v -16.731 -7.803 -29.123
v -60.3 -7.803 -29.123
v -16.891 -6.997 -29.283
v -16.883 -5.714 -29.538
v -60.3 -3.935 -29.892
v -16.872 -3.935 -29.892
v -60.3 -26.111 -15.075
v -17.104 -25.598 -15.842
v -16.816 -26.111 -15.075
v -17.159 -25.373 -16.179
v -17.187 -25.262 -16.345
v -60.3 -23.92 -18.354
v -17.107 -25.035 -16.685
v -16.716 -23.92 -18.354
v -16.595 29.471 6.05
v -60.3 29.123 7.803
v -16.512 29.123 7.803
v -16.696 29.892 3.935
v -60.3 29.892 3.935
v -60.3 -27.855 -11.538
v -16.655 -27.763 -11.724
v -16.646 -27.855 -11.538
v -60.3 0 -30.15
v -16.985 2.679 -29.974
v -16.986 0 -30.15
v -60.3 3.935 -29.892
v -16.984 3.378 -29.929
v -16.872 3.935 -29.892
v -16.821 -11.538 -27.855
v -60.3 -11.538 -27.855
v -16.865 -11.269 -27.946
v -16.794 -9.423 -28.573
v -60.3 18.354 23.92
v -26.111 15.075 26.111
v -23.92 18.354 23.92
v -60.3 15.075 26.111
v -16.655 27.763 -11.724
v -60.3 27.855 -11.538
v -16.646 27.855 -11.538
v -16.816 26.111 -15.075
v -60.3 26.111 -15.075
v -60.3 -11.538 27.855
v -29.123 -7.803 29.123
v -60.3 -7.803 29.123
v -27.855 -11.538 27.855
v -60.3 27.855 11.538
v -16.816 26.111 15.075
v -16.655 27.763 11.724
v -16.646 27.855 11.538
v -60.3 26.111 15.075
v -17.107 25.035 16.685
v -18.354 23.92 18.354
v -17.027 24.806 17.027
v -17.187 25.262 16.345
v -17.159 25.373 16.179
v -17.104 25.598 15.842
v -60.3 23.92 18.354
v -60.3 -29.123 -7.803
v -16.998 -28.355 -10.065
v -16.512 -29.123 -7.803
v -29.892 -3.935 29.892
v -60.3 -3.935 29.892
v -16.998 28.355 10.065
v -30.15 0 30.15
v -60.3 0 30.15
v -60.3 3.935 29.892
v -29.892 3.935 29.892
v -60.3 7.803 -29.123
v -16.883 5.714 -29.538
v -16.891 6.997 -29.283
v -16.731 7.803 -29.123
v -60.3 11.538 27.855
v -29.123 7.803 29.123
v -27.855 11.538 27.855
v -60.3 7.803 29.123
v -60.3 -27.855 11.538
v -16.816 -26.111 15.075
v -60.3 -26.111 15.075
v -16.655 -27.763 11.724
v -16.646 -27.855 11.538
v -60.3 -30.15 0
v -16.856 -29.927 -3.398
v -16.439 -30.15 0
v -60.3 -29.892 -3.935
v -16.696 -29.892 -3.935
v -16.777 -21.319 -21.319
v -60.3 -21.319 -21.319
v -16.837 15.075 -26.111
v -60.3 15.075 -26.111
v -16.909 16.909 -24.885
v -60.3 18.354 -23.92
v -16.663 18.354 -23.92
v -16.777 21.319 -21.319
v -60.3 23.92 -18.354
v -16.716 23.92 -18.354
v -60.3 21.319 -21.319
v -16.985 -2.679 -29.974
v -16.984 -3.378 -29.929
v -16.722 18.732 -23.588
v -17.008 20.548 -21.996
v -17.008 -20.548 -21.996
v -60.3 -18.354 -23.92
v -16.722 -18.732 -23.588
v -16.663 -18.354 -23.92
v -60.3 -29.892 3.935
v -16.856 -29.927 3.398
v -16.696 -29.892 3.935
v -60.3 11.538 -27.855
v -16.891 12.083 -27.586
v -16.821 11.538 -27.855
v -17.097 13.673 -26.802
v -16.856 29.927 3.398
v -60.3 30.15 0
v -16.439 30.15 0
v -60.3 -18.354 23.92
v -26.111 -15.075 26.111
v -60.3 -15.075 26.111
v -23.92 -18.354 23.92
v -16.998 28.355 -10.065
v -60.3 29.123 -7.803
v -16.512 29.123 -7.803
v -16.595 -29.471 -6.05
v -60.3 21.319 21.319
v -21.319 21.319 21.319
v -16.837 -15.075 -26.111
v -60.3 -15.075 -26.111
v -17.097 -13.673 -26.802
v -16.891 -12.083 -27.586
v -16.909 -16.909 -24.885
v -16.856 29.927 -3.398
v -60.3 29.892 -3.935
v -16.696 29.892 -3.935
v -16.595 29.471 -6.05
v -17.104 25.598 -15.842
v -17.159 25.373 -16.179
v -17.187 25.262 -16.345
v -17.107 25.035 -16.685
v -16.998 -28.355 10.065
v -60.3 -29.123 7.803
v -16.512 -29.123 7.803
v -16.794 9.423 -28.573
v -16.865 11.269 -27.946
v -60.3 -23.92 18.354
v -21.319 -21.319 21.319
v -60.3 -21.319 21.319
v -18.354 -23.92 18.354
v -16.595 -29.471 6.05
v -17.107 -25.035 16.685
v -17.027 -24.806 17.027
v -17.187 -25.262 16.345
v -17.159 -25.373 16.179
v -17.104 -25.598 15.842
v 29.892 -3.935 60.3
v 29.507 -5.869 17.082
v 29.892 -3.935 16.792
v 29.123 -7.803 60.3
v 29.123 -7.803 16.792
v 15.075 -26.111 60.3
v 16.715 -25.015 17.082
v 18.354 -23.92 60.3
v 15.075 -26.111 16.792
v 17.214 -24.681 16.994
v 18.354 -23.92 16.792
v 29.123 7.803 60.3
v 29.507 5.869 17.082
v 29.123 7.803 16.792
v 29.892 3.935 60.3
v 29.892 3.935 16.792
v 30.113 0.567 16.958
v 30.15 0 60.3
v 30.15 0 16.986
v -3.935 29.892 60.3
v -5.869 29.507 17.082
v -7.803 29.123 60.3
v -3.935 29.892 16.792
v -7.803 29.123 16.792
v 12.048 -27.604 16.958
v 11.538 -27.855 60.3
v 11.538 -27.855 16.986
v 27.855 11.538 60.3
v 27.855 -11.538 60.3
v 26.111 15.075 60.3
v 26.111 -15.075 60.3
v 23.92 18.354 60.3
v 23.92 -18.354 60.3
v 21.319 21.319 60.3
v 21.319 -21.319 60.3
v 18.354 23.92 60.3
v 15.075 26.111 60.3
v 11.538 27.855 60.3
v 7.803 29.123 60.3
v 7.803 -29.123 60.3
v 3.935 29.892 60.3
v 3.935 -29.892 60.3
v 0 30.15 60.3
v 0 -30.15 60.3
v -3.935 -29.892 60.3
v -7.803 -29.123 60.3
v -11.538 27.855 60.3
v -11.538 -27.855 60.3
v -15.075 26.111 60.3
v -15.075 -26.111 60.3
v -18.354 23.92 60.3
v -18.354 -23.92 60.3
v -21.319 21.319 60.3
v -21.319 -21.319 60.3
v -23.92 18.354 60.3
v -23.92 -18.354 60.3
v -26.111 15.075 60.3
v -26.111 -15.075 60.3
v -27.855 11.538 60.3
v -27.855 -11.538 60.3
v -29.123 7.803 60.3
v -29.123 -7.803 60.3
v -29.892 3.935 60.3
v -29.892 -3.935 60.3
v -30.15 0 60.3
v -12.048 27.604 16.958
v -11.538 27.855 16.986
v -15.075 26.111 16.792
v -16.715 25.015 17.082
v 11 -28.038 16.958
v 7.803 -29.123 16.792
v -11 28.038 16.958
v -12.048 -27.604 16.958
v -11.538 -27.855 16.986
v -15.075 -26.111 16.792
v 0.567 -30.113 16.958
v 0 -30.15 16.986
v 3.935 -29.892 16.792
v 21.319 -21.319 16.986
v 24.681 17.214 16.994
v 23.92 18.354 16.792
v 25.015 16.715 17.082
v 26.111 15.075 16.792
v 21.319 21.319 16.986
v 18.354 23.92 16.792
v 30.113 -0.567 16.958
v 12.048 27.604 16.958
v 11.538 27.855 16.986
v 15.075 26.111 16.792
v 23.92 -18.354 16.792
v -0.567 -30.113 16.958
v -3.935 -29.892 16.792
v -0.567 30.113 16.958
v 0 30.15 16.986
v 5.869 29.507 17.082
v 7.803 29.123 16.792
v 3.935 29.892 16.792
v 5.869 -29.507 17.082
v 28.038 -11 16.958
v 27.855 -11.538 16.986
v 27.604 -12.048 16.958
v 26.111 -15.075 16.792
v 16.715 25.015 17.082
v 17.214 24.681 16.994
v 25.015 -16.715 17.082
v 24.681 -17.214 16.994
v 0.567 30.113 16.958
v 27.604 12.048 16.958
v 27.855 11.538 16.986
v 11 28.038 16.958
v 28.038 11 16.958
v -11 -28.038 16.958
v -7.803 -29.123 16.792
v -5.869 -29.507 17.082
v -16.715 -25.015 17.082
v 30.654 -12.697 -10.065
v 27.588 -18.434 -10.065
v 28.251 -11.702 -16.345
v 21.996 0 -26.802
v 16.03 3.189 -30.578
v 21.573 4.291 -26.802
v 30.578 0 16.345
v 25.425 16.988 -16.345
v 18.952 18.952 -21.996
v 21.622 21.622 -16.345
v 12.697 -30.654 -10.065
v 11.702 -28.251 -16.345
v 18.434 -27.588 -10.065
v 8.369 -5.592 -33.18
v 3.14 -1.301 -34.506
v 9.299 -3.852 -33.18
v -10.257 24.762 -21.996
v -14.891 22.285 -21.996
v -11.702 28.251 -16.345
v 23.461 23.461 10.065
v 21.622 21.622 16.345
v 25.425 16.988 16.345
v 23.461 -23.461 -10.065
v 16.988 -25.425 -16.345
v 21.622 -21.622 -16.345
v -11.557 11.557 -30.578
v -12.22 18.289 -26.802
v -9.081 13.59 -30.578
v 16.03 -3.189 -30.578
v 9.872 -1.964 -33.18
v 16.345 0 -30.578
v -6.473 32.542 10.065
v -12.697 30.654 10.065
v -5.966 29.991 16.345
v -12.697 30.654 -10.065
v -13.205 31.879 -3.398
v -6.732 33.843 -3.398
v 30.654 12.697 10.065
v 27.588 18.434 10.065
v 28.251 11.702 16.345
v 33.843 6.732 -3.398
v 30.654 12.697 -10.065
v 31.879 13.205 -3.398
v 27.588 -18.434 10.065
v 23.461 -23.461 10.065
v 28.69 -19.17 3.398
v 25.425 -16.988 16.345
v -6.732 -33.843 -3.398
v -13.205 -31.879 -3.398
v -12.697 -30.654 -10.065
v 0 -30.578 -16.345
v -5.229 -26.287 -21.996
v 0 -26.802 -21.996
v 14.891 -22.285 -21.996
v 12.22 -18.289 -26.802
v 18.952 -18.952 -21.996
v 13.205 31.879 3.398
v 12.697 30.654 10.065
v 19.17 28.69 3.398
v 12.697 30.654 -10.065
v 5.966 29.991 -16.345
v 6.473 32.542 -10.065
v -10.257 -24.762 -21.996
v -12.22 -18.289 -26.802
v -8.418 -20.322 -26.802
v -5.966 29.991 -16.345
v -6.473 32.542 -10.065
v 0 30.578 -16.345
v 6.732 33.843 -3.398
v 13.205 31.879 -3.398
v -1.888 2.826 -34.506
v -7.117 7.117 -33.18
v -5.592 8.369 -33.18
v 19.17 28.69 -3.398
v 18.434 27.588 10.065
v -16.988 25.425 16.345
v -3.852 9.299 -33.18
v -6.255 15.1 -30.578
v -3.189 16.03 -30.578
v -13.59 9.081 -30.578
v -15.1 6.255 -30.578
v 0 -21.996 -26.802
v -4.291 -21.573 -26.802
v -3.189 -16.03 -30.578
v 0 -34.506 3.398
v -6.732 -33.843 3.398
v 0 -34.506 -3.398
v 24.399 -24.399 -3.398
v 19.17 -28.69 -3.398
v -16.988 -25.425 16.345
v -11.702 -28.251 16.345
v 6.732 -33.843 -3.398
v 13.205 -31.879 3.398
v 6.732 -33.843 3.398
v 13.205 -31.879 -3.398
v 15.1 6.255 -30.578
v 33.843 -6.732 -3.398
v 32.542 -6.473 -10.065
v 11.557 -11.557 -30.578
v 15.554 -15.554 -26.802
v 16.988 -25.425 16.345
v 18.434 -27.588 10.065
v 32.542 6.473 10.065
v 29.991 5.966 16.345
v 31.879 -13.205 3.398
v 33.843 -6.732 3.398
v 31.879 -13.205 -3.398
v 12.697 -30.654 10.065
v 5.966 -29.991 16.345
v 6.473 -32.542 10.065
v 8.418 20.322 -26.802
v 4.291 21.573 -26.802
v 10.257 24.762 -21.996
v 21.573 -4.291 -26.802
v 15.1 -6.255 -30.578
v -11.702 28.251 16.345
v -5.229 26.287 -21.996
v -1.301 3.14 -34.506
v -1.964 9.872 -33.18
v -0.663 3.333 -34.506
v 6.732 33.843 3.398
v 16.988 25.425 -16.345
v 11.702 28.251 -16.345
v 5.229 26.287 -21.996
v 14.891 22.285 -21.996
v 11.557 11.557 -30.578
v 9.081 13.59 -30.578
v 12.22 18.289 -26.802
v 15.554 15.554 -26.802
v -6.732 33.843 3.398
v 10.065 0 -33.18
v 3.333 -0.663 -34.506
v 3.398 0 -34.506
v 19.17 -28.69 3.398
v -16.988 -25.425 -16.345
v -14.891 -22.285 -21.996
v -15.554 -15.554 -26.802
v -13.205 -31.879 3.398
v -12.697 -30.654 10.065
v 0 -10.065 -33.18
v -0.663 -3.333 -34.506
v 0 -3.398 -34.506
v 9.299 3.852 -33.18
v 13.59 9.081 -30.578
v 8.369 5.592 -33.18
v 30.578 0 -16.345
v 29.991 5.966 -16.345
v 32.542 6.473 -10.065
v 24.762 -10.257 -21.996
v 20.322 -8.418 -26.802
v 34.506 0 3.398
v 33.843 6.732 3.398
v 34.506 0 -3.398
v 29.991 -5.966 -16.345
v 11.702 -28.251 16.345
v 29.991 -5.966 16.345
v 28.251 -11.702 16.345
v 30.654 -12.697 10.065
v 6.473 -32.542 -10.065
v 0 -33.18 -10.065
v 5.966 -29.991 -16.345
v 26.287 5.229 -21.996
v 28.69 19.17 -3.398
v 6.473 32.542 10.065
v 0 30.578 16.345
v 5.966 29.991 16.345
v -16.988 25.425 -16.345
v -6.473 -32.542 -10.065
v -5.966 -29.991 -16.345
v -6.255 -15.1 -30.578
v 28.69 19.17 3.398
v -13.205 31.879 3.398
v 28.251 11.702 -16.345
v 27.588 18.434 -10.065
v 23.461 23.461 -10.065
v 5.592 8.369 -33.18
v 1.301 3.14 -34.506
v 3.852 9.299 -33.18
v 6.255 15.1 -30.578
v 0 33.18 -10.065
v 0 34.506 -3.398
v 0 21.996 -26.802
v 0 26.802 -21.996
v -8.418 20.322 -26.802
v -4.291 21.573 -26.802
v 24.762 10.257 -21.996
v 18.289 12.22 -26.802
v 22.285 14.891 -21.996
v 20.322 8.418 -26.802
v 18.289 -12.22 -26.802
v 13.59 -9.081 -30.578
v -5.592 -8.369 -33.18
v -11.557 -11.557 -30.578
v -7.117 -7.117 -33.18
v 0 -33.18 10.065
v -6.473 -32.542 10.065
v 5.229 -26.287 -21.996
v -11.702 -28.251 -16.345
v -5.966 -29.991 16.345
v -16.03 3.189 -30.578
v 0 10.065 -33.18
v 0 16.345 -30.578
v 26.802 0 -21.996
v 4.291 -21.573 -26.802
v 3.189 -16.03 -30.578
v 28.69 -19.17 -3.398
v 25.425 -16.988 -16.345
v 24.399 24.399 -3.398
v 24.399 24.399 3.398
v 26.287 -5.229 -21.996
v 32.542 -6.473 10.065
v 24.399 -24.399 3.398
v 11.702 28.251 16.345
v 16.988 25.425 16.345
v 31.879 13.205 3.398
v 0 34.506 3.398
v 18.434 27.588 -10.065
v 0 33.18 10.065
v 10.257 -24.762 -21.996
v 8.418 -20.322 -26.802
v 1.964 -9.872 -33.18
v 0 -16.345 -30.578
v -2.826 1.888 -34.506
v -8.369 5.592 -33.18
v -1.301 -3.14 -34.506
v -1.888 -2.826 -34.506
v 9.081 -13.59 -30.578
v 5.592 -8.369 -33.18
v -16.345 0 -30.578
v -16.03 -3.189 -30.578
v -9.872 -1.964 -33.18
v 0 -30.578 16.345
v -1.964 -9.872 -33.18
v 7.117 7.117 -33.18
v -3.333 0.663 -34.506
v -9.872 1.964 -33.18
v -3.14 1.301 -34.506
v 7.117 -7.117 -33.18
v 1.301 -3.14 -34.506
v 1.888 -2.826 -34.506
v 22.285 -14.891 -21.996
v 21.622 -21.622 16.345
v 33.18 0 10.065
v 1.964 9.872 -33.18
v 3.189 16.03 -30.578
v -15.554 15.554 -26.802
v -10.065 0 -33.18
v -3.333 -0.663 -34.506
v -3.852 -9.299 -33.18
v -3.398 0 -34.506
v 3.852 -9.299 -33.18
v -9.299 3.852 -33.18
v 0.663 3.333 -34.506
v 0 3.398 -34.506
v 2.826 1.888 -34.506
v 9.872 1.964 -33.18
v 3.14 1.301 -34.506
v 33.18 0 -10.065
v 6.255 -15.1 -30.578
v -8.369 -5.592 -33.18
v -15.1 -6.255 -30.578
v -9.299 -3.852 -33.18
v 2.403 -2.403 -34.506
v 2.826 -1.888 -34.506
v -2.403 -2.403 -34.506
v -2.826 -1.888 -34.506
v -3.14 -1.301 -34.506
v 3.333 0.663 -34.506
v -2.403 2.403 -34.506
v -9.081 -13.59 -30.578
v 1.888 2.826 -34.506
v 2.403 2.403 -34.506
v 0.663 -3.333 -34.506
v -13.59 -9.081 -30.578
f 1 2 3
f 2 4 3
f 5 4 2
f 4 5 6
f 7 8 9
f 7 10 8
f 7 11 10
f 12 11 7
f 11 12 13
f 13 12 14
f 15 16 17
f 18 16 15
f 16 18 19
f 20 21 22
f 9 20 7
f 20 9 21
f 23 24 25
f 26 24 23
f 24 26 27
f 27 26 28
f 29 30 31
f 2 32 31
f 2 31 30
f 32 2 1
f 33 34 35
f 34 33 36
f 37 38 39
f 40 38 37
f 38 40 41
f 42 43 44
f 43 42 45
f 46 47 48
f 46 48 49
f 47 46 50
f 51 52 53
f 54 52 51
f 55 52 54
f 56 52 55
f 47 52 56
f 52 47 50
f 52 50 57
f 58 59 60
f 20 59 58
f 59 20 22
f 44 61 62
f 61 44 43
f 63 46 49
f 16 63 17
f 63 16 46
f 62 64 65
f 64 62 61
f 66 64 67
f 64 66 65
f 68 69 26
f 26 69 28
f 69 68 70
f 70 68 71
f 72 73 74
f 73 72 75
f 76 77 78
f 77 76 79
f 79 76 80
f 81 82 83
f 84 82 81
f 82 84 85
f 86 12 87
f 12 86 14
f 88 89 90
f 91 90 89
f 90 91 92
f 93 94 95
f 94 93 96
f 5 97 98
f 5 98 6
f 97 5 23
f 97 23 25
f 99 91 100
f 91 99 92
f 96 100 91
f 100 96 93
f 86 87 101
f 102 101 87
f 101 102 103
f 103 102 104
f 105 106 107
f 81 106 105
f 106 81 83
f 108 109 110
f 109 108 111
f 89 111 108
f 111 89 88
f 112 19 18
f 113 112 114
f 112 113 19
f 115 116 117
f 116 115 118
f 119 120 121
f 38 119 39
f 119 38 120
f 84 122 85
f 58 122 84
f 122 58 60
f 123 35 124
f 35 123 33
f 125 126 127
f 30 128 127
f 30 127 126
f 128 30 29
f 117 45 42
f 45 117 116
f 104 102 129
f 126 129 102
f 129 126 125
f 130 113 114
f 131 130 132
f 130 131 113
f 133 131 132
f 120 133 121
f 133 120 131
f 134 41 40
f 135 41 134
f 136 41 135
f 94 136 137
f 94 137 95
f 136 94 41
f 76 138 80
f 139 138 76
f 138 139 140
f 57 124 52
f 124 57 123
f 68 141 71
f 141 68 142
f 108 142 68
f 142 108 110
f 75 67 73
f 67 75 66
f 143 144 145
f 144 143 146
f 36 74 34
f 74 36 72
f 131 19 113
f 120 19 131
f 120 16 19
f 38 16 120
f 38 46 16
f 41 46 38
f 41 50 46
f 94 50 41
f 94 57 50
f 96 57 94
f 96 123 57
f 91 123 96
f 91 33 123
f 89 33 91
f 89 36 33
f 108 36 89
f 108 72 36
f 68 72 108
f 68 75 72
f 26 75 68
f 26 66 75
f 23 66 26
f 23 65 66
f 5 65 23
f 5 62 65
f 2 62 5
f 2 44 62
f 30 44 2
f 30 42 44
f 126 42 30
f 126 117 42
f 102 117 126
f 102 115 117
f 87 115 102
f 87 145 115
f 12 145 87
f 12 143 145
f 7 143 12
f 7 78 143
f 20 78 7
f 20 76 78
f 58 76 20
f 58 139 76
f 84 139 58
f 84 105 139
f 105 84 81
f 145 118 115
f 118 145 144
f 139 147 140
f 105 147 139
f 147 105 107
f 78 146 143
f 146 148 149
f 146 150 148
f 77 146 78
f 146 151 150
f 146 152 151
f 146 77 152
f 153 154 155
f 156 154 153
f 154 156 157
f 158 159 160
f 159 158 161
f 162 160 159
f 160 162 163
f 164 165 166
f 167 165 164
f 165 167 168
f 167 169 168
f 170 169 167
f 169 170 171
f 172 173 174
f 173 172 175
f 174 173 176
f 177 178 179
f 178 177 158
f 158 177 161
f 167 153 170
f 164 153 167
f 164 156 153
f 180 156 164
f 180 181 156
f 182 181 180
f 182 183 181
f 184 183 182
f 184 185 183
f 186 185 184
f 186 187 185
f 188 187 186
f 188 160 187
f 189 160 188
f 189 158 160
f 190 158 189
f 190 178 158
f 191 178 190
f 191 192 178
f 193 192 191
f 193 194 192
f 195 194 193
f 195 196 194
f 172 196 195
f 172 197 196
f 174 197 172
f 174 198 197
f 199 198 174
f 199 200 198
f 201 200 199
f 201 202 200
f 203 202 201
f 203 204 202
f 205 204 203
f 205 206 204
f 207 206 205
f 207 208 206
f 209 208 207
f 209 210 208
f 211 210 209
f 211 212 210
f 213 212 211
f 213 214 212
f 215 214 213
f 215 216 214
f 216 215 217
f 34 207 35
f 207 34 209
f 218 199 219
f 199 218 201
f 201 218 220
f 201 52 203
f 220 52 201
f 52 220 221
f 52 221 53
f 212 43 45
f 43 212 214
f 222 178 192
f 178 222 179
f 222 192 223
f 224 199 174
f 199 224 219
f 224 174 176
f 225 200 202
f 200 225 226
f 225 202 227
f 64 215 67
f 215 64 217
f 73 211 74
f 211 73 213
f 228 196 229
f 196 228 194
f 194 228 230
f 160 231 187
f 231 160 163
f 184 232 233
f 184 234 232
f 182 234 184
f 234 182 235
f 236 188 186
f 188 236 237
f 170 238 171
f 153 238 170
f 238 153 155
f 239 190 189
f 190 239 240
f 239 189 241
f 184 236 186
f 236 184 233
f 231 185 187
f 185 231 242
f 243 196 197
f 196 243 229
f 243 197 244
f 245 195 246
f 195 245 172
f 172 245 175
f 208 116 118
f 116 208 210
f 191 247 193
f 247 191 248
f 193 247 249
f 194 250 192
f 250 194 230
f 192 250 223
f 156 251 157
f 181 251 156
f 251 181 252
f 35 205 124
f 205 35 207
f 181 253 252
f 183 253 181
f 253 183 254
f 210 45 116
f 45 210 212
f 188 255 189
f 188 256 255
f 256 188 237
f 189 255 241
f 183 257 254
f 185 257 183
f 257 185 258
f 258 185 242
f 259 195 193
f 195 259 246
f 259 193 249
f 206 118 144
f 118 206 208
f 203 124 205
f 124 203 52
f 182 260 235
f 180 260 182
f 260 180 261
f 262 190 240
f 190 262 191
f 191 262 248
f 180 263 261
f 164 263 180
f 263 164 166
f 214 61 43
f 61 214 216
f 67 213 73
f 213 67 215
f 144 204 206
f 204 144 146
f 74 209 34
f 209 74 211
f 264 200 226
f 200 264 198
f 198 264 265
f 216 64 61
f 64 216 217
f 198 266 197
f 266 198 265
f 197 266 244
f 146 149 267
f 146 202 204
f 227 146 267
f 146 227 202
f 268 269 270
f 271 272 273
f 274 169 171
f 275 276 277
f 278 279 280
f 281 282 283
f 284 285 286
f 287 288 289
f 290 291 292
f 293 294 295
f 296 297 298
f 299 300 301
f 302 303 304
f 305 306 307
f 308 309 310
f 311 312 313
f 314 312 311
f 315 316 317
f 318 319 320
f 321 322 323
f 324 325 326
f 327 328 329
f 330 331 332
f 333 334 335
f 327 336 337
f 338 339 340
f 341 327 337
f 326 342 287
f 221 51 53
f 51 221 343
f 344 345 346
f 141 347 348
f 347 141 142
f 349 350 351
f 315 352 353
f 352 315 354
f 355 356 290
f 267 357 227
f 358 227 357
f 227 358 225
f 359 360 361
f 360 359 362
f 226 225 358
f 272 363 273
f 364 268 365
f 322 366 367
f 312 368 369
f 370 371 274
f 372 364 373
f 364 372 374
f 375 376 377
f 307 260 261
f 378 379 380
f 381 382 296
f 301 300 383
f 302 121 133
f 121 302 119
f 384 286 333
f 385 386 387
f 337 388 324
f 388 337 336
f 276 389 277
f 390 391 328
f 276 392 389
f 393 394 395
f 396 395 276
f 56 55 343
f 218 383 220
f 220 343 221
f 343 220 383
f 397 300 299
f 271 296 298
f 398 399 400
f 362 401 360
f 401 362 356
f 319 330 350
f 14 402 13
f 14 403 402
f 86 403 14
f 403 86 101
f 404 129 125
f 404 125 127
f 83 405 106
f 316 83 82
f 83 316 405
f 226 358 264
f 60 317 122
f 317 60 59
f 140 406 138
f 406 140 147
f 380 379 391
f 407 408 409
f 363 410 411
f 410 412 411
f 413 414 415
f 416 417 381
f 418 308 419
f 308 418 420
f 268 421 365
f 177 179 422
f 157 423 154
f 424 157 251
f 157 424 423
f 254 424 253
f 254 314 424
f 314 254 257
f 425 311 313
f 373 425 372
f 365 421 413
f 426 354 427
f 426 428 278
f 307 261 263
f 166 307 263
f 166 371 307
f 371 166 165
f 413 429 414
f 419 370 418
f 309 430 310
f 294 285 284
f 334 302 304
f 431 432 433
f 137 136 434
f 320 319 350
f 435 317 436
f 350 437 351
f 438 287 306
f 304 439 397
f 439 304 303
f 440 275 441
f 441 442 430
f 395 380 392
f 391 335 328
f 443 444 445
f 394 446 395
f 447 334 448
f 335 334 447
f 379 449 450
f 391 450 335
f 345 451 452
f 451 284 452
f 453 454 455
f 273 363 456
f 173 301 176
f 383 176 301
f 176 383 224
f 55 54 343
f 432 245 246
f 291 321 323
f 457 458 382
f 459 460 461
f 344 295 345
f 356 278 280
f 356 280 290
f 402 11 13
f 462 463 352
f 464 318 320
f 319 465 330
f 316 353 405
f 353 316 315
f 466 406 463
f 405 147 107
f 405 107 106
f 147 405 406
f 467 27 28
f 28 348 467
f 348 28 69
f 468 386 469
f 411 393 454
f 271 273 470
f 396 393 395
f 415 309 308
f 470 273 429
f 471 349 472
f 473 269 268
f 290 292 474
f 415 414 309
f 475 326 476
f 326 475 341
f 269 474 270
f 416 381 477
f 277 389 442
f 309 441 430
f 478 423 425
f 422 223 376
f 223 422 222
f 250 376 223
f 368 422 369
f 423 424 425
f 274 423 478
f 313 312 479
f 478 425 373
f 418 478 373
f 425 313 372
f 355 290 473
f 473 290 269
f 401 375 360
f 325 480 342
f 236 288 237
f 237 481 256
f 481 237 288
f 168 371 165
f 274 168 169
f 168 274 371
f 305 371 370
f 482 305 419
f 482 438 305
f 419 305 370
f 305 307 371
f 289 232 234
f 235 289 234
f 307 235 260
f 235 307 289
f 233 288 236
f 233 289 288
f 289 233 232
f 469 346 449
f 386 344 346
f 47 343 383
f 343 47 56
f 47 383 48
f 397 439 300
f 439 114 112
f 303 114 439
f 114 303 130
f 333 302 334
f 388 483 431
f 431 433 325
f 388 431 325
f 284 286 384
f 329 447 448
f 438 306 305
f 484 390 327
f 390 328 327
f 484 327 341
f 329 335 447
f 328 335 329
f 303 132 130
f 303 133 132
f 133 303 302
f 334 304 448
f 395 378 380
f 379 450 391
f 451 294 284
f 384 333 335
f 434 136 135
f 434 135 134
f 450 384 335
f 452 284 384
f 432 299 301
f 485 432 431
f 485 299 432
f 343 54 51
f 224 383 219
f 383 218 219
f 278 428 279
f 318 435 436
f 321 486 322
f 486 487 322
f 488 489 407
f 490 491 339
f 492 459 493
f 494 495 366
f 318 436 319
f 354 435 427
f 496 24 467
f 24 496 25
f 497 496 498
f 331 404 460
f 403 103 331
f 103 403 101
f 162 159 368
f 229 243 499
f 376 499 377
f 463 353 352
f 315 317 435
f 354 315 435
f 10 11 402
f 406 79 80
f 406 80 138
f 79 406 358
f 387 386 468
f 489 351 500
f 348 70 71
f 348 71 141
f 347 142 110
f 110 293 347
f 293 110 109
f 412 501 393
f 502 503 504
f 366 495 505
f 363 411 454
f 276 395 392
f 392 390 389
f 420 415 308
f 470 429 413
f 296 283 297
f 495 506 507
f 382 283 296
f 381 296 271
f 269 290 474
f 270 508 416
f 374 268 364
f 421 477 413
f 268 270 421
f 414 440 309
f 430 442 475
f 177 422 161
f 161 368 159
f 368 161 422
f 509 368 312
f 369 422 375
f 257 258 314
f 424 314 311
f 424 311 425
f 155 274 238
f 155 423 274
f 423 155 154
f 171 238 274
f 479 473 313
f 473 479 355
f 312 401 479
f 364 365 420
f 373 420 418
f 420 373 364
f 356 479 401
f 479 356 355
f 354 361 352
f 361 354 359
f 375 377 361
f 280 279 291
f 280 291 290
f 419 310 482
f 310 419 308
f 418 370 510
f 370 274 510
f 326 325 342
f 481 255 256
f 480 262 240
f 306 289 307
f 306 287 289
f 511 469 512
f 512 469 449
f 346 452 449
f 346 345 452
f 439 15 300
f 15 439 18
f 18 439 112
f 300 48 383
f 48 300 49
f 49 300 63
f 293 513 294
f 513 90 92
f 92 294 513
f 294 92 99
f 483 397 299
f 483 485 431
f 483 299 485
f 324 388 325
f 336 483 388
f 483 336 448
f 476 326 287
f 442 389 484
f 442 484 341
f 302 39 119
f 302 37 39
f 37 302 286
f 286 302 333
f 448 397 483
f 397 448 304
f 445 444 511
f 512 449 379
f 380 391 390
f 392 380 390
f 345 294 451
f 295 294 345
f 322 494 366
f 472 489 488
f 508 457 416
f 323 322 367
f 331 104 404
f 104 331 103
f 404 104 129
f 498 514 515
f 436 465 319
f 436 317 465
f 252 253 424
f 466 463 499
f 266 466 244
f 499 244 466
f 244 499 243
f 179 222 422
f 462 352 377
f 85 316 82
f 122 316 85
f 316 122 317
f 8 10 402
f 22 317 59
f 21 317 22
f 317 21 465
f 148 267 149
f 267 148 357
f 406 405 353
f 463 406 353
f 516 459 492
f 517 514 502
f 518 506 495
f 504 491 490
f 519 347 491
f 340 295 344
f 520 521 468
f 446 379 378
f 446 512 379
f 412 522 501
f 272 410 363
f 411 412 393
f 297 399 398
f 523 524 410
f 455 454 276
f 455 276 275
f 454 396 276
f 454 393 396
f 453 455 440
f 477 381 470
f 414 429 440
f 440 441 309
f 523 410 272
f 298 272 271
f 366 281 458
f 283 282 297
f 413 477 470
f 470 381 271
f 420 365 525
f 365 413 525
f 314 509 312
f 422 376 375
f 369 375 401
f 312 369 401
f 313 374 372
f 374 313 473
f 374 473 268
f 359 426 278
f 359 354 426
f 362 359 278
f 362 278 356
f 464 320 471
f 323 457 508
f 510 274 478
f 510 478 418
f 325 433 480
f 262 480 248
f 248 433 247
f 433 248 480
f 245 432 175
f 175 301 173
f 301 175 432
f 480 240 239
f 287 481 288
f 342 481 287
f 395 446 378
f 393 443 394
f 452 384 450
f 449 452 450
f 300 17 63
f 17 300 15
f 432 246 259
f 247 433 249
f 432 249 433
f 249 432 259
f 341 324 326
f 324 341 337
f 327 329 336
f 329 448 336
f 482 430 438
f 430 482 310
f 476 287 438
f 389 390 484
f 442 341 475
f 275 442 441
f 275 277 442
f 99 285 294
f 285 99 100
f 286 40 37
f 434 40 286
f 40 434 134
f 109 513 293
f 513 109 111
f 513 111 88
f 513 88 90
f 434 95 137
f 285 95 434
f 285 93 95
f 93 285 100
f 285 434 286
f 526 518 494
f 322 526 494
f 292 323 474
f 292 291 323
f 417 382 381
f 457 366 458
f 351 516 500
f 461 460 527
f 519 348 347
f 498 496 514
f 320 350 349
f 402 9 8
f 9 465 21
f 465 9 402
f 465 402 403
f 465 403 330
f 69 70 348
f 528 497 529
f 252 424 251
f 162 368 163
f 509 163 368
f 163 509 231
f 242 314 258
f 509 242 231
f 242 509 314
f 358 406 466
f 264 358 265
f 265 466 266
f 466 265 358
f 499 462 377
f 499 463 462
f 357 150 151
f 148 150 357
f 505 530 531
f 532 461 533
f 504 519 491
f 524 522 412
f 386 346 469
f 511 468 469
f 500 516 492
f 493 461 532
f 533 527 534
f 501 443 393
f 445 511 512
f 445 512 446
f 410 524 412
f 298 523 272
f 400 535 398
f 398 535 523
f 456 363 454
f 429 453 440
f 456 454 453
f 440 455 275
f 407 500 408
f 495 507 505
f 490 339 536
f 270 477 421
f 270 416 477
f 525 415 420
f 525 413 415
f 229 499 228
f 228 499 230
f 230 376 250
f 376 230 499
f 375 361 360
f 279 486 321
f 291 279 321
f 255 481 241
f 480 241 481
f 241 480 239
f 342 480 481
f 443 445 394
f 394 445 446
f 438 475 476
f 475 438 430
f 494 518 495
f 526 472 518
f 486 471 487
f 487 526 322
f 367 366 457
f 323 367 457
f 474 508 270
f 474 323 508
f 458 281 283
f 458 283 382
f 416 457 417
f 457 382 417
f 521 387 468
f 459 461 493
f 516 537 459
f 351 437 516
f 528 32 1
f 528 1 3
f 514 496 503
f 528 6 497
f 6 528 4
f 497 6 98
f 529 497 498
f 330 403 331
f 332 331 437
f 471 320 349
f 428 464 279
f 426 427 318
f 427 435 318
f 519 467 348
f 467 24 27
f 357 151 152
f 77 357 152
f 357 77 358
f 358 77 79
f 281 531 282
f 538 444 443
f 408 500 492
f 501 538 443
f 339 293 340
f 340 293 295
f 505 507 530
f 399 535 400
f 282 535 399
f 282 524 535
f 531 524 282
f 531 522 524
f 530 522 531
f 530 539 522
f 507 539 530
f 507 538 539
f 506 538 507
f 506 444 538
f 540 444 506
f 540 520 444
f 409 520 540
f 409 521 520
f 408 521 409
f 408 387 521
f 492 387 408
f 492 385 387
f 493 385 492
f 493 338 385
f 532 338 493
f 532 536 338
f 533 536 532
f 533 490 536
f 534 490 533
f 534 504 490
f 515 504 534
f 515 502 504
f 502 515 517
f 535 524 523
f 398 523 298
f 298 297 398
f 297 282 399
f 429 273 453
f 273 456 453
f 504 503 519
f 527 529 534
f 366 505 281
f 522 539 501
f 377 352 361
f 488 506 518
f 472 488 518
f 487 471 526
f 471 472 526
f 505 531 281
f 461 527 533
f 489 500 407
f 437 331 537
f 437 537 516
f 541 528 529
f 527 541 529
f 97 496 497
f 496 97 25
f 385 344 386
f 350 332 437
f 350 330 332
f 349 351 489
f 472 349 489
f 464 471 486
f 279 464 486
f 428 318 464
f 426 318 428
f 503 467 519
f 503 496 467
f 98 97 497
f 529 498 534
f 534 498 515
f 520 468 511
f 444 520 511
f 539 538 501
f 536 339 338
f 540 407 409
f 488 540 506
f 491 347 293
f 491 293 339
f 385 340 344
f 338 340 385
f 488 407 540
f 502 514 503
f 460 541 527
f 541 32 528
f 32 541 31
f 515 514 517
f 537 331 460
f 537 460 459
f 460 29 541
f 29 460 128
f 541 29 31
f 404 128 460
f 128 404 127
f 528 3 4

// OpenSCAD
// Auto-generated by scripts/author_from_manifest.py (Phase D.3).
// Source: data/phase_d_manifest.json (sku_intent='victaulic-no10-elbow-90-grooved-2in').
// Do not hand-edit — regenerate from the manifest.
//
// @part victaulic_no10_elbow_90_grooved_2in
// @kind fitting
// @category fitting.elbow
// @display-name "Victaulic No. 10 90° Grooved Elbow 2\""
// @mfg victaulic
// @mfg-pn No._10_2in
// @listing UL FM
// @price-usd 42.00
// @install-minutes 6
// @crew journeyman
// @param size_in number default=2 label="Size" unit="in"
// @port in position=[-0.05,0,0] direction=[-1,0,0] style=grooved size_in=2 role=run_a
// @port out position=[0,0,0.05] direction=[0,0,1] style=grooved size_in=2 role=run_b

size_in = 2.0;

function od_mm(nps) =
    nps ==   1  ? 33.4 :
    nps == 1.25 ? 42.2 :
    nps == 1.5  ? 48.3 :
    nps ==   2  ? 60.3 :
    nps == 2.5  ? 73.0 :
    nps ==   3  ? 88.9 :
    nps ==   4  ? 114.3 :
    nps ==   5  ? 141.3 :
    nps ==   6  ? 168.3 :
    nps ==   8  ? 219.1 :
    nps ==  10  ? 273.0 : 60.3;

od = od_mm(size_in);
leg = od * 1.0;

union() {
    // Inlet leg along -X
    translate([-leg/2, 0, 0])
        rotate([0, 90, 0])
        cylinder(h = leg, d = od, center = true, $fn = 48);
    // Outlet leg along +Z
    translate([0, 0, leg/2])
        cylinder(h = leg, d = od, center = true, $fn = 48);
    // Knuckle
    sphere(d = od * 1.15, $fn = 32);
}
